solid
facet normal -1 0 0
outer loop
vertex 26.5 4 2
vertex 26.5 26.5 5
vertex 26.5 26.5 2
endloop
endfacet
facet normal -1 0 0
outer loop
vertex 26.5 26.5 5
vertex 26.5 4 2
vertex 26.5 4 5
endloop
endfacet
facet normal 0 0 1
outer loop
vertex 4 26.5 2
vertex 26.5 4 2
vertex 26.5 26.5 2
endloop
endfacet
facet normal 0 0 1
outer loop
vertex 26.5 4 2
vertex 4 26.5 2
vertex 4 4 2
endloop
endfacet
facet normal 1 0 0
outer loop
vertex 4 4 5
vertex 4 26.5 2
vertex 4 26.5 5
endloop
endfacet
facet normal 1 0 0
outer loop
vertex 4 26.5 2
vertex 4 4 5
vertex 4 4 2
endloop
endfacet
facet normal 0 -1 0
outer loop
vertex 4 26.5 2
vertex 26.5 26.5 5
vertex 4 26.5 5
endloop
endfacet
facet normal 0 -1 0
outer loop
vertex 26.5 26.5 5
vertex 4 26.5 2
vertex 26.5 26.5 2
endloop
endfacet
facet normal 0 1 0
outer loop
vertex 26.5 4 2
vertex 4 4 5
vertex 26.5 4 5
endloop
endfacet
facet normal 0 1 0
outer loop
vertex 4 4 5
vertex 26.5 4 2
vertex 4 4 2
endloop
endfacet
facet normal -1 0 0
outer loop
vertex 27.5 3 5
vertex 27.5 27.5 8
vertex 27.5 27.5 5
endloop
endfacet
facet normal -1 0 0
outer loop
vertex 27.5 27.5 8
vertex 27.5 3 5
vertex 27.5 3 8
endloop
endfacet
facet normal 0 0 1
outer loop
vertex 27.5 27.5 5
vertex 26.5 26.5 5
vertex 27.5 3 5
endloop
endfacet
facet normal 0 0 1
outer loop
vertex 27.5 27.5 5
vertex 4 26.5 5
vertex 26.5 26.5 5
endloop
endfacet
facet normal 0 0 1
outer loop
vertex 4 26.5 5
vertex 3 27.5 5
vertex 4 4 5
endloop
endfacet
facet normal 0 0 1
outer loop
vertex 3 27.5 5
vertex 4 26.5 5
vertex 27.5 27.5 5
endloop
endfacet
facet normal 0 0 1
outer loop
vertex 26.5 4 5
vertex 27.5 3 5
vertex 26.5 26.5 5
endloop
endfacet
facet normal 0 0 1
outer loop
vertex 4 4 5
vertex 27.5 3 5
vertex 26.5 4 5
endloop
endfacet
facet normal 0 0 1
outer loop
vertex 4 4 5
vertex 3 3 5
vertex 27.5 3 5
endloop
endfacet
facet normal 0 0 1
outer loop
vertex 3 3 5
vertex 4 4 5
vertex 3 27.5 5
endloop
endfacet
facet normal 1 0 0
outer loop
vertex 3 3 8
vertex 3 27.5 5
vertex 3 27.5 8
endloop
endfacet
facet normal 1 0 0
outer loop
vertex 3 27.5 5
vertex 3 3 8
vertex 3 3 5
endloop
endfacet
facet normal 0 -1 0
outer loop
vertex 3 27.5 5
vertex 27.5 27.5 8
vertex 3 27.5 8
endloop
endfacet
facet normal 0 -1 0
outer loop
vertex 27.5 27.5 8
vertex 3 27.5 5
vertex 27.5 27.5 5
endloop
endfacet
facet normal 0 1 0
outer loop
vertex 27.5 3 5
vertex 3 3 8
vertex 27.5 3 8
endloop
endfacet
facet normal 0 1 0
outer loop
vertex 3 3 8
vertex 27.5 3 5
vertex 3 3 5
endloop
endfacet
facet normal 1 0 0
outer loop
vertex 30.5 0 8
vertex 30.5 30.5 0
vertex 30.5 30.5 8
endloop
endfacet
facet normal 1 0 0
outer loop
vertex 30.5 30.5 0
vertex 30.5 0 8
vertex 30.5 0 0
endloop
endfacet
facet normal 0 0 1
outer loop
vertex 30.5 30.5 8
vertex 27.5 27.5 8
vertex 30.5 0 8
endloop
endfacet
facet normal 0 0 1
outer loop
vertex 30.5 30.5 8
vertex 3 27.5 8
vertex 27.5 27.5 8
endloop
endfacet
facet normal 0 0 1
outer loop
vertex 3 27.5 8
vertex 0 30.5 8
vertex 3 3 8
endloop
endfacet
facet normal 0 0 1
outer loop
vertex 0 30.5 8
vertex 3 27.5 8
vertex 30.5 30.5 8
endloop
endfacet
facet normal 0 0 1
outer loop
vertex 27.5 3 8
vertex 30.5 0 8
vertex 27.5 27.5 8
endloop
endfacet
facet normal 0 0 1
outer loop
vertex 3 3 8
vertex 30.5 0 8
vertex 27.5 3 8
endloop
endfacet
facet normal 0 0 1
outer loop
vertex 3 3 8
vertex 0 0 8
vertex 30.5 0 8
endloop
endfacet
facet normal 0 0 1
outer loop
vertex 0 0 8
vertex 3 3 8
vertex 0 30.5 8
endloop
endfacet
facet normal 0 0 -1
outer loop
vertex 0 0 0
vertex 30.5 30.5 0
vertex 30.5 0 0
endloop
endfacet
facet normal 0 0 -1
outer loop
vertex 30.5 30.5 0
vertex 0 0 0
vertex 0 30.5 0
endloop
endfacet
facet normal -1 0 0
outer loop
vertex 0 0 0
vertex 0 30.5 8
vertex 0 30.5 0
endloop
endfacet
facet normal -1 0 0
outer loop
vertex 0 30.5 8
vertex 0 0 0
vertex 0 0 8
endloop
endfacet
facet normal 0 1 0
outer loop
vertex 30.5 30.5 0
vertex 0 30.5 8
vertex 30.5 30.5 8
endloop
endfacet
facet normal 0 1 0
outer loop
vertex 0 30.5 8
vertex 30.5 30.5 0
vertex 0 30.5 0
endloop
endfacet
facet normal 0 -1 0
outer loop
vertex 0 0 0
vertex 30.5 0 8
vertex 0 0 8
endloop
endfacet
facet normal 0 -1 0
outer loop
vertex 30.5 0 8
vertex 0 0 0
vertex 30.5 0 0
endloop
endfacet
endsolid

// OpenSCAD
// color sensor holder

//sensor dimensions
sensorLength = 20.5;

//Holder dimensions
extraRoom = 1;
holderLength = sensorLength + extraRoom*2;
holderHeight = 6;
wallThickness = 4;
transparentCoverThickness = 3;


difference(){
    holder();
    cavity();
}

module holder(){
    cube([holderLength+(wallThickness*2),holderLength+(wallThickness*2),holderHeight + 2]);
}

module cavity(){
    translate([wallThickness,wallThickness,2])cube([holderLength,holderLength,holderHeight+1]);
    translate([wallThickness-1,wallThickness-1,holderHeight-transparentCoverThickness+2])cube([holderLength+2,holderLength+2,holderHeight+10]);
}
